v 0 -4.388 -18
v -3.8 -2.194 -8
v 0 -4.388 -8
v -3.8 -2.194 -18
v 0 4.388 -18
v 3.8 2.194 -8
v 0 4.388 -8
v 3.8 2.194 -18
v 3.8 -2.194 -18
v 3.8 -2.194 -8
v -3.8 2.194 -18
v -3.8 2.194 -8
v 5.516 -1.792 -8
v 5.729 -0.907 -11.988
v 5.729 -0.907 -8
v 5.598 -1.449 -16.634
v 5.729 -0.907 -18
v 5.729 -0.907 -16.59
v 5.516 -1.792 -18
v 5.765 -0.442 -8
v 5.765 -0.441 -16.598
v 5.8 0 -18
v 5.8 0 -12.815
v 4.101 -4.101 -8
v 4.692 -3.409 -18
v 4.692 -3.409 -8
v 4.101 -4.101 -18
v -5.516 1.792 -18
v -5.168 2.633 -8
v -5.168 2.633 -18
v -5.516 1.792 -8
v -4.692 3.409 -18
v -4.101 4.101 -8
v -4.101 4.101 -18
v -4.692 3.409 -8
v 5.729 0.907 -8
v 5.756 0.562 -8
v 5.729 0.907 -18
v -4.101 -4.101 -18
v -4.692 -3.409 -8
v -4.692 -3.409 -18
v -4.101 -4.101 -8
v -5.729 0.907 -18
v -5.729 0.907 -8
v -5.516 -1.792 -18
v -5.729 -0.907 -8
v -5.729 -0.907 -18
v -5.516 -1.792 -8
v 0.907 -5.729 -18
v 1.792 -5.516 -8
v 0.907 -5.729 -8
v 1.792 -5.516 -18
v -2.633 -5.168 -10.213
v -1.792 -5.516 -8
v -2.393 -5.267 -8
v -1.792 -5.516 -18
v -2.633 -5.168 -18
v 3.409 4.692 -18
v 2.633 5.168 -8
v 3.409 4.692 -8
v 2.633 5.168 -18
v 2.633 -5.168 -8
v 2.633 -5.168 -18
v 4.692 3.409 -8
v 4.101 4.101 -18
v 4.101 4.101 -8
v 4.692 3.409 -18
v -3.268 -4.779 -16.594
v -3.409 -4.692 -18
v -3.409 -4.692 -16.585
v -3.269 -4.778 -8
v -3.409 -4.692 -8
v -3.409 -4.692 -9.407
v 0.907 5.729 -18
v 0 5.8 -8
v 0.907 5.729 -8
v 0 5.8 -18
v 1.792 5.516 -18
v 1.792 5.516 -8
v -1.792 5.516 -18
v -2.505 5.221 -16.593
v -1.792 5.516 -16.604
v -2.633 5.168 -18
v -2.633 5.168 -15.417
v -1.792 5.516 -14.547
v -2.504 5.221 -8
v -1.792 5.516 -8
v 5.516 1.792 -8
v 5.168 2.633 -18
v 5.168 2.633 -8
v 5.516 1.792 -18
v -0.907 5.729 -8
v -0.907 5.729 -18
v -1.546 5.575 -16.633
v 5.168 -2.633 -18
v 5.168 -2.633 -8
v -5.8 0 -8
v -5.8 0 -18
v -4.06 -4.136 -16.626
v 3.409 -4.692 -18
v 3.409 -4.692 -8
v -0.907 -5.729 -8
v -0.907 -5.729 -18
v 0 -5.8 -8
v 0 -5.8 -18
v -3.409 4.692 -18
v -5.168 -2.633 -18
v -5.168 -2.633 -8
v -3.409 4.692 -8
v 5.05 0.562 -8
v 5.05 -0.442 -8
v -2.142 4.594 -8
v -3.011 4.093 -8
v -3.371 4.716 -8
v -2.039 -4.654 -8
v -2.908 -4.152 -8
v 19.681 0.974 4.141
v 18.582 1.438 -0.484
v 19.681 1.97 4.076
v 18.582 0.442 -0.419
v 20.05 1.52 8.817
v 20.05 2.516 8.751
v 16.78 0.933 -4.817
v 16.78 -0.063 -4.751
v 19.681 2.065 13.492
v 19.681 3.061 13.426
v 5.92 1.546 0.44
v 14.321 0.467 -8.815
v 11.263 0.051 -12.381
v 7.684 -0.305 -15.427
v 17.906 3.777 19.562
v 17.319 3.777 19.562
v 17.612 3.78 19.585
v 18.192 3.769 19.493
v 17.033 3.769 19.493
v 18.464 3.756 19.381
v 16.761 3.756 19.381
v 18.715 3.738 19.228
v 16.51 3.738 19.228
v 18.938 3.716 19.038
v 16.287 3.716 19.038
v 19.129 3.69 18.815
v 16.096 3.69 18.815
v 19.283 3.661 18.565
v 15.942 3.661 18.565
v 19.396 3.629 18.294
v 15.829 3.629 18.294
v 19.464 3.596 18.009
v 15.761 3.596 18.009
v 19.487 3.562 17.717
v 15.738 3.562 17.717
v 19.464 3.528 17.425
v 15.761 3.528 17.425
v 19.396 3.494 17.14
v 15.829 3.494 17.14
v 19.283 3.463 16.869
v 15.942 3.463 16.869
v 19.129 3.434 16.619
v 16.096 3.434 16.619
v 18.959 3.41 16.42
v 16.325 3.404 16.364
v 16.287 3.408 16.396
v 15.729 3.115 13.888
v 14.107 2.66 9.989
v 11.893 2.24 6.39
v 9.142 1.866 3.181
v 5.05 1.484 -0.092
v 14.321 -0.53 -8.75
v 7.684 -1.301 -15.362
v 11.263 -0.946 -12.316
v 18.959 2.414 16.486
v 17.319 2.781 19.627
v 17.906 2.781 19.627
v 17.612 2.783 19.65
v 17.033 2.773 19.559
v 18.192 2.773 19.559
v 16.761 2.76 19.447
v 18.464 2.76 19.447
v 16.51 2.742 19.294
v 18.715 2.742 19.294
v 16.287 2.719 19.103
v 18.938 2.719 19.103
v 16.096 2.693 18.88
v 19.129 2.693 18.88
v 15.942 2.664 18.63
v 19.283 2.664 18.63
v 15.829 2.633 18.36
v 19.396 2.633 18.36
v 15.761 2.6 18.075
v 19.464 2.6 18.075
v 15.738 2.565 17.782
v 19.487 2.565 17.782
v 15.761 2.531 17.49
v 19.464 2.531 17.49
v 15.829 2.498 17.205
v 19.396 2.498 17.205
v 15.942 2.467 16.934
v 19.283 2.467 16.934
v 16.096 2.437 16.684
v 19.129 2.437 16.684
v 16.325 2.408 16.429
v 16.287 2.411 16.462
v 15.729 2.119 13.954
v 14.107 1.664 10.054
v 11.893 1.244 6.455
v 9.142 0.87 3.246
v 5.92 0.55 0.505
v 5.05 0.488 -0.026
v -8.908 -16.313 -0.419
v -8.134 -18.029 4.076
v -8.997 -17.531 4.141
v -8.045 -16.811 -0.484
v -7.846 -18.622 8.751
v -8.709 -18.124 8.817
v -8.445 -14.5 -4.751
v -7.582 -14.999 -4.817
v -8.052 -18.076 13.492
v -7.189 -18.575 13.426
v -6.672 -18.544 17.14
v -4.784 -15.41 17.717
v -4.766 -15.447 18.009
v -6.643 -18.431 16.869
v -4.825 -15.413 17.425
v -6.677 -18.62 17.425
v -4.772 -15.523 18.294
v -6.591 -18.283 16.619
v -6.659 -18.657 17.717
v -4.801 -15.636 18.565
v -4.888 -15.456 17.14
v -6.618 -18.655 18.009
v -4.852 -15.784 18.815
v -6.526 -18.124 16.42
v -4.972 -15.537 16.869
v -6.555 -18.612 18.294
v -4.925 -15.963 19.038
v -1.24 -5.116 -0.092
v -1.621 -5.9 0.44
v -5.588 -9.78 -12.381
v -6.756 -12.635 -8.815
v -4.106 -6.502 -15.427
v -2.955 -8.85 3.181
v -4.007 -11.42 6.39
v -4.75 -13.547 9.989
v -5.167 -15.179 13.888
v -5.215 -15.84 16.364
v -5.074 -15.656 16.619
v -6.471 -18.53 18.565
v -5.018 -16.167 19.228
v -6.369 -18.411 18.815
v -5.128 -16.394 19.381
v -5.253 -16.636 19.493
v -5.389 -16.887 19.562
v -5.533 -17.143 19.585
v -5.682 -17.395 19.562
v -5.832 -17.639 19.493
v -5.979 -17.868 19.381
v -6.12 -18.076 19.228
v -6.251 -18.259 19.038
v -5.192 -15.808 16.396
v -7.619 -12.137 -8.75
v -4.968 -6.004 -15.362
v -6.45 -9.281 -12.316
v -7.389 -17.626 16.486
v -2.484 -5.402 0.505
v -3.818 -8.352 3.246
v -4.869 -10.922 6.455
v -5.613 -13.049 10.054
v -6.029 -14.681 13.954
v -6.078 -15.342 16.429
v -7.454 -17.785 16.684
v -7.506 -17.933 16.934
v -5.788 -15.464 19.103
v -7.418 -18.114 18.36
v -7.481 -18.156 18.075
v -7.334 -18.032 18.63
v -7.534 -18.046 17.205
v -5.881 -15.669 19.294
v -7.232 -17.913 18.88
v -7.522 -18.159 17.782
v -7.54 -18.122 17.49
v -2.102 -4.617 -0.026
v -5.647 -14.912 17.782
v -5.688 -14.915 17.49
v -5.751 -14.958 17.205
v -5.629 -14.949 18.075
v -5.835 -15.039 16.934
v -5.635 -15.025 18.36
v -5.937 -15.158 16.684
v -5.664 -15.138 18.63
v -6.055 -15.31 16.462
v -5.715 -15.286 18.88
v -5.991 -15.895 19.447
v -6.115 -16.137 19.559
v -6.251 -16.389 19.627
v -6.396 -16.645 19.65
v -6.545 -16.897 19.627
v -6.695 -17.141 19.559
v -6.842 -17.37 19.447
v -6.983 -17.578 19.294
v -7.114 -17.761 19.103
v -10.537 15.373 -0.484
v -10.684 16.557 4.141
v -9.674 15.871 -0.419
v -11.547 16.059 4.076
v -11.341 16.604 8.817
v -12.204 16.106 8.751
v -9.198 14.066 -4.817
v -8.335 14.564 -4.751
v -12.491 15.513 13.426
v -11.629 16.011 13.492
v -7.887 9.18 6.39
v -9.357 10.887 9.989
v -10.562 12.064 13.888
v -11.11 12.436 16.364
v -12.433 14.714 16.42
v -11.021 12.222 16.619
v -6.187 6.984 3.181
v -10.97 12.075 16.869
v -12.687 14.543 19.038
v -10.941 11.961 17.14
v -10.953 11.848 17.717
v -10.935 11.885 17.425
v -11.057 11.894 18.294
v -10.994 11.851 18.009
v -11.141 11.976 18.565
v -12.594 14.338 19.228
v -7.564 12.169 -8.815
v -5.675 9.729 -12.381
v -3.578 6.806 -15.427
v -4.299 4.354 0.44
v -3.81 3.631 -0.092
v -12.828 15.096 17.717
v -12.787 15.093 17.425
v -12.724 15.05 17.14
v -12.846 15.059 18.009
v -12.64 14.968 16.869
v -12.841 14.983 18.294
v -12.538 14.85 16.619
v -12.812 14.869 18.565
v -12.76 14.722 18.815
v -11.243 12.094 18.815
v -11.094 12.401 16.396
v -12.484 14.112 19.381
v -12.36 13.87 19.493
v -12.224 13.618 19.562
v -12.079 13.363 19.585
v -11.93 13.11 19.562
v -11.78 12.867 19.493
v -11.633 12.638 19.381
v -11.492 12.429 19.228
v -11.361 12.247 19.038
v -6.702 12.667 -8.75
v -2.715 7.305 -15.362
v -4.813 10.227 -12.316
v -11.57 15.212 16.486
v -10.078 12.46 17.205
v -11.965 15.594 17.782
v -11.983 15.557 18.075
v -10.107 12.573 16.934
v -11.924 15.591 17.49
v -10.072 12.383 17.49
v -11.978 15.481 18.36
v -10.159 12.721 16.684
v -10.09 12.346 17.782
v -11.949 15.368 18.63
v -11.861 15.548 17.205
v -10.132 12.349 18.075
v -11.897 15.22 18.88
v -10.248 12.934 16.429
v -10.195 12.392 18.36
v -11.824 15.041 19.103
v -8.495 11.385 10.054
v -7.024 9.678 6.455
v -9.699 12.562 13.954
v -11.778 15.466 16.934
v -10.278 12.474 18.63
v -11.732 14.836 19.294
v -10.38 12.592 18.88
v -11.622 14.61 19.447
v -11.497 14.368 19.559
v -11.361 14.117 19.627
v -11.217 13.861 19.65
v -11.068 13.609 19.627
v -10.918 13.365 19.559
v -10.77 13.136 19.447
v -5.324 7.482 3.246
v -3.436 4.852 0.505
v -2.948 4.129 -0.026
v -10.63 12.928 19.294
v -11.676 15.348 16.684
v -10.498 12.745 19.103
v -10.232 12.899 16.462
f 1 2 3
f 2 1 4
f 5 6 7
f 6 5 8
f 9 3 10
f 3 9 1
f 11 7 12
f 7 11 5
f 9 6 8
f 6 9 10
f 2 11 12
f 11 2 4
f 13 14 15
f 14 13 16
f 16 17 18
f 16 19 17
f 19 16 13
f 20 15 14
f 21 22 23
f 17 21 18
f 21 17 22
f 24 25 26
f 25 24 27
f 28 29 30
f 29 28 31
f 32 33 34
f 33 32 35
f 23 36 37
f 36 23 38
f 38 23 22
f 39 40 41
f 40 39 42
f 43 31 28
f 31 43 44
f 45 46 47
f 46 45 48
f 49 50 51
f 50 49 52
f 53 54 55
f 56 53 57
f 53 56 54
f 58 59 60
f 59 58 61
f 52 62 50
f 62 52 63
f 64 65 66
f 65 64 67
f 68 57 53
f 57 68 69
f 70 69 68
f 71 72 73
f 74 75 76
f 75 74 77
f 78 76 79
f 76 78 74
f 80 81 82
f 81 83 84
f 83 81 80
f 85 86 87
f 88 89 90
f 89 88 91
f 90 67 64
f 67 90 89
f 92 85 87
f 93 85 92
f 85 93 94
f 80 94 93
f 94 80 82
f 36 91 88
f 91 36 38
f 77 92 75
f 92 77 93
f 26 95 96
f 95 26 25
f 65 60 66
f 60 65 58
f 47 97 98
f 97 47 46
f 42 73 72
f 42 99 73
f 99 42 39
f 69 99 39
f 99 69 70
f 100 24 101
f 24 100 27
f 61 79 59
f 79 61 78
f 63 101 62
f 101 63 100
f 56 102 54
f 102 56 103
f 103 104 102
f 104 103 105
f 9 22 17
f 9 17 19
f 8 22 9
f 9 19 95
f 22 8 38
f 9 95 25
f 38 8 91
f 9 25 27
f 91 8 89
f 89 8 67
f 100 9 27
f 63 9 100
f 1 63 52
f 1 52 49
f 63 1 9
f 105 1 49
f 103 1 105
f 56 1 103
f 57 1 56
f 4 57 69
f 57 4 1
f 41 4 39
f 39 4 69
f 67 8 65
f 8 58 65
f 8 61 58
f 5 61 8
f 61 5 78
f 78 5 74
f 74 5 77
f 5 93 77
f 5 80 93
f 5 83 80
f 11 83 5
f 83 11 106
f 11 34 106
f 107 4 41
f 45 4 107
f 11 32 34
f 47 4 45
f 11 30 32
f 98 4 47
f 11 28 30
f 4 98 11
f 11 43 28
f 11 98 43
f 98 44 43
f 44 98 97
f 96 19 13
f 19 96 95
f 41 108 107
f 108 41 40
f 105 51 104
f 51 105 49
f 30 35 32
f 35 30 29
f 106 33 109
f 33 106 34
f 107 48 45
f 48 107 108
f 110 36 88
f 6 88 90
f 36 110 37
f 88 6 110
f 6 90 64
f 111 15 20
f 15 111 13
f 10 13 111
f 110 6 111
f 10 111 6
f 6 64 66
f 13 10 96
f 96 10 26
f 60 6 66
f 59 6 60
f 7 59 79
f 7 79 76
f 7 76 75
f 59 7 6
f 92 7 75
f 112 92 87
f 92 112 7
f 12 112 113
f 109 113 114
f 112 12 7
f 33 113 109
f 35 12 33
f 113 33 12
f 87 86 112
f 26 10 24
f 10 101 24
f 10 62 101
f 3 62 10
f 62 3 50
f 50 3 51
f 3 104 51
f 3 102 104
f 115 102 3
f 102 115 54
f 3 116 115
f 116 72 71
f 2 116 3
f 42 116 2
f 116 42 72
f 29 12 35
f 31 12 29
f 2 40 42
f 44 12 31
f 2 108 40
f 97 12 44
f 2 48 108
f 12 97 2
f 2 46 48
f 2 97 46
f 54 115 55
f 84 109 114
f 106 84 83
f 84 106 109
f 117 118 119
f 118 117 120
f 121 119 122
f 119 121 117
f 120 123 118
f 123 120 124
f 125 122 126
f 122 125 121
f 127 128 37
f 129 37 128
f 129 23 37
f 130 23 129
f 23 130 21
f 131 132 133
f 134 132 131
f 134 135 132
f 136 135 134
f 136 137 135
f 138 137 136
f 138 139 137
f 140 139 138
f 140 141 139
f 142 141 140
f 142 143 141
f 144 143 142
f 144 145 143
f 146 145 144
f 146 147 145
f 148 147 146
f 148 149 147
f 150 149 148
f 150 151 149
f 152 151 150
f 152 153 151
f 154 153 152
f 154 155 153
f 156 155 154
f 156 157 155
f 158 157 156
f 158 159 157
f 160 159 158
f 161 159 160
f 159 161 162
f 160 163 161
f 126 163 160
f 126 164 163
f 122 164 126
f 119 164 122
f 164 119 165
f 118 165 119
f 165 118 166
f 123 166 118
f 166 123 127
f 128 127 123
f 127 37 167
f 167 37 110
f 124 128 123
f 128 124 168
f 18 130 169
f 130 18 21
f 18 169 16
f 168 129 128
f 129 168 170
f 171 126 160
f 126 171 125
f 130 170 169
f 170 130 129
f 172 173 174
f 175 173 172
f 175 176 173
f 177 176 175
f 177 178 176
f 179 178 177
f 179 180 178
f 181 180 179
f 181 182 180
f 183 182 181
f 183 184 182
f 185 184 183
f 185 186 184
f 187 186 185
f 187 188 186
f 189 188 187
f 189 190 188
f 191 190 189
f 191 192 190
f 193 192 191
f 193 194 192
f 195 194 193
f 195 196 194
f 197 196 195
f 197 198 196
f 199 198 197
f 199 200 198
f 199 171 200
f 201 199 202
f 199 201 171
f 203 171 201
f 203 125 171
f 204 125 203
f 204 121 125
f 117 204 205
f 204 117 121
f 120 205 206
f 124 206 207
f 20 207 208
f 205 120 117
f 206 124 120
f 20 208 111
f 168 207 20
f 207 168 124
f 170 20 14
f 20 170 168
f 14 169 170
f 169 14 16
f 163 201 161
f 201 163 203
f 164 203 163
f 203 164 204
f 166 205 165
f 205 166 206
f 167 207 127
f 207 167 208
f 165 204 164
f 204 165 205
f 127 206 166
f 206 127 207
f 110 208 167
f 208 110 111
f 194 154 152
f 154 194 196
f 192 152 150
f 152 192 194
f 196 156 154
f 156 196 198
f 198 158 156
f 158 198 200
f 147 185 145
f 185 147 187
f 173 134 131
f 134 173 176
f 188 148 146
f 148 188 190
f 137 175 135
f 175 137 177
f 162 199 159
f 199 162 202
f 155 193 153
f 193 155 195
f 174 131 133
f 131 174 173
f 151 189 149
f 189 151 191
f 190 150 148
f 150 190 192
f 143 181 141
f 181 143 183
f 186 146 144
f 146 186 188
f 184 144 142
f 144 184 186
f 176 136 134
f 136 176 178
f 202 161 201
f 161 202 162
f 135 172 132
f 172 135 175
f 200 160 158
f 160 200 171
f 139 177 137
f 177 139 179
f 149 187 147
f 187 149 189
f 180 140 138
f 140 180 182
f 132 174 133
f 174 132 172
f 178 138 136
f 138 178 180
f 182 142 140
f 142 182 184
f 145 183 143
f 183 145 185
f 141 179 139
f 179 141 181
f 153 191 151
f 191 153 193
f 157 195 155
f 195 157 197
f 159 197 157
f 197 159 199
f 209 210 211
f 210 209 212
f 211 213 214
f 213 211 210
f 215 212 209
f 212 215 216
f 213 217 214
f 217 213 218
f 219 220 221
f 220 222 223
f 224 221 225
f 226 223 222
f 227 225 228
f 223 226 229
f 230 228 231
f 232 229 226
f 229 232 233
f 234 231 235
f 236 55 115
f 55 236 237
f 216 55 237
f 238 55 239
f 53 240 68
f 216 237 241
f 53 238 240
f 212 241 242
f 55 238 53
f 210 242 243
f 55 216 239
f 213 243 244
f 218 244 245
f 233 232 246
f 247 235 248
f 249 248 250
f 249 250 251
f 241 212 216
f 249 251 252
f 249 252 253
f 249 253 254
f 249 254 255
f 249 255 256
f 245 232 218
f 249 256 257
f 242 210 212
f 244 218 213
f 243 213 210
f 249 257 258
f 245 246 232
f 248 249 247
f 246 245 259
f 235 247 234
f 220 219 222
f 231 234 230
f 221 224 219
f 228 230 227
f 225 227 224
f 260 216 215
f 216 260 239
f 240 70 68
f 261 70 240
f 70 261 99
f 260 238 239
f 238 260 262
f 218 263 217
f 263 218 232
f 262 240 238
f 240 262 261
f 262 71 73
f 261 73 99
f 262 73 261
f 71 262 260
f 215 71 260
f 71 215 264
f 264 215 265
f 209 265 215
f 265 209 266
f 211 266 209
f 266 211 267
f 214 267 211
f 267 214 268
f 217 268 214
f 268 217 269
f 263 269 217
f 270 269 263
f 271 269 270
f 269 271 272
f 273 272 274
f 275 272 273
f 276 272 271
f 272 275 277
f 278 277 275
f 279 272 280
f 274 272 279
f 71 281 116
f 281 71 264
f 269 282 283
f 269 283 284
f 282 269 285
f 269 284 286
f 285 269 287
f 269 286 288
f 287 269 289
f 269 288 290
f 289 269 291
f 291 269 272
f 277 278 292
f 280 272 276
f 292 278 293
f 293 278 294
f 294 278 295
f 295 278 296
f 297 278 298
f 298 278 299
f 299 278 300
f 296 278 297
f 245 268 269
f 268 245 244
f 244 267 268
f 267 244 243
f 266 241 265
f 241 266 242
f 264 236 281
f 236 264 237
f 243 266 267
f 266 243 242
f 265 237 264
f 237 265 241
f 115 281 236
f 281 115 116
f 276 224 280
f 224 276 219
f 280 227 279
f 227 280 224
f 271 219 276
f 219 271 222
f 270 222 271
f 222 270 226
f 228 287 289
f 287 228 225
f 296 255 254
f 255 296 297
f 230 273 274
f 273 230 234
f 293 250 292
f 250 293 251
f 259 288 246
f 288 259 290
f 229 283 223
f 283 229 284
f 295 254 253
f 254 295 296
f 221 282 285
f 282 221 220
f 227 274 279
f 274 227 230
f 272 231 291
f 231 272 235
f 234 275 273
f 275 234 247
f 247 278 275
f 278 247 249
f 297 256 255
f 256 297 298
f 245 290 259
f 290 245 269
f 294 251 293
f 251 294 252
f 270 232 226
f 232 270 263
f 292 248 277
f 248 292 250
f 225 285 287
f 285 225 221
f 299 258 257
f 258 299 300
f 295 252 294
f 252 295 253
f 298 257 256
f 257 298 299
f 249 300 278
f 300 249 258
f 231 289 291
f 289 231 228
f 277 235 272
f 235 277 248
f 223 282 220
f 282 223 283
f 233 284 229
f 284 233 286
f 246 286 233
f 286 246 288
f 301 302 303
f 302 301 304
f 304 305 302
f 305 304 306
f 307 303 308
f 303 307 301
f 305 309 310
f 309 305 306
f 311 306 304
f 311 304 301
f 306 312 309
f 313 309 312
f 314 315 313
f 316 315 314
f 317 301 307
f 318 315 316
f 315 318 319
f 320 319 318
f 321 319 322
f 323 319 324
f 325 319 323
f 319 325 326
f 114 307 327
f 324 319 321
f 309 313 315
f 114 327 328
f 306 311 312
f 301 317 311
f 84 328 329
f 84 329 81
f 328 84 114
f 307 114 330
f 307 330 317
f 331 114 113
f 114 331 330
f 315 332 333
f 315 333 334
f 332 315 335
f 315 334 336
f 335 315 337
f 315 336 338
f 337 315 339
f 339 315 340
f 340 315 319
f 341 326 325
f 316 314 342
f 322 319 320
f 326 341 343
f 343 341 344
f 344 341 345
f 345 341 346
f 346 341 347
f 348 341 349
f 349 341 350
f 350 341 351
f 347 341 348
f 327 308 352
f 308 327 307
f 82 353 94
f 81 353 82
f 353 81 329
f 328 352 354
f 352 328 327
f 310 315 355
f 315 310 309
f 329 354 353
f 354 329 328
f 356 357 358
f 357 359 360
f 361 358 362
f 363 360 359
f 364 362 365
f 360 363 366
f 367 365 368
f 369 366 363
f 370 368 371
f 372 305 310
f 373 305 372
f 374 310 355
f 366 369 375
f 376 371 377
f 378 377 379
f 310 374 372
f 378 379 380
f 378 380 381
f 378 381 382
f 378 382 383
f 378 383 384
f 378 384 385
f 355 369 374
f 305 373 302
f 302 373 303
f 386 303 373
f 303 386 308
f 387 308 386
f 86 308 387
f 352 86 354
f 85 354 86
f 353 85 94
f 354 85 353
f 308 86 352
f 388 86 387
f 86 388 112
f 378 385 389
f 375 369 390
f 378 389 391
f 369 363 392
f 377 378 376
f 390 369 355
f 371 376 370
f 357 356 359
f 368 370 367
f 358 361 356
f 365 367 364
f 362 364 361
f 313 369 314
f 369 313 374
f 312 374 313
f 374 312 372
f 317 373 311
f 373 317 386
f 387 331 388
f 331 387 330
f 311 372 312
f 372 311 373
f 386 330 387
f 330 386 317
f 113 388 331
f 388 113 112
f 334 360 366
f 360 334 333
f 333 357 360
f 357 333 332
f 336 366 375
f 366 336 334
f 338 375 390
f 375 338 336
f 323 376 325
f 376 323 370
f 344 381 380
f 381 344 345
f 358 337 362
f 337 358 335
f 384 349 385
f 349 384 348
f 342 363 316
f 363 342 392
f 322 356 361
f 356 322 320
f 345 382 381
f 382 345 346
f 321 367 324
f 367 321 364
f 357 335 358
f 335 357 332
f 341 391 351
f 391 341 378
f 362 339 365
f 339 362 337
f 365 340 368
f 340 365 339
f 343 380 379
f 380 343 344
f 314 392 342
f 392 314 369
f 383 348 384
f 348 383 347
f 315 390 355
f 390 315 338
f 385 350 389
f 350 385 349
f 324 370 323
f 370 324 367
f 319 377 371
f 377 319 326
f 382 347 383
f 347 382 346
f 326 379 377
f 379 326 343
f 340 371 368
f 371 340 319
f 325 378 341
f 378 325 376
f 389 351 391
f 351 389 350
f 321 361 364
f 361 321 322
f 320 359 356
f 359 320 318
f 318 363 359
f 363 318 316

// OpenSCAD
/*
 * Convertible Pencil Rocket / Pencil Stand
 *
 * by Alex Franke (CodeCreations), Nov 2012
 * http://www.theFrankes.com
 * 
 * Licenced under Creative Commons Attribution - Non-Commercial - Share Alike 3.0 
 * 
 * INSTRUCTIONS: Choose some values in the "User-defined values" section, render, and print. 
 * 
 * v1.10, Dec 1, 2012: Added spin angle to angle fins for spinning.
 * v1.00, Nov 28, 2012: Initial Release.
 *
 * TODO: 
 *   * Nothing at this time. 
 */

/////////////////////////////////////////////////////////////////////////////
// User-defined values... 
/////////////////////////////////////////////////////////////////////////////

finThickness     = 1;    // Thickness of fins
finCount         = 3;    // Number of fins
finInset         = 0.75; // Distance fins are inset from surface
finScale         = 0.75; // Scale the fins larger (>1) or smaller (<1)
spinAngle        = -5;   // Rotation of fins in order to provide spin
pencilInDiameter = 7.6;  // Diameter of pencil (flat to flat for hex) 6.85 == Ticonderoga #2
bandThickness    = 2;    // The maximum thickness of the band the fins are attached to 
bandHeight       = 10;   // The height of the band
bandTranslation  = 8;    // The distance the band is translated toward the top of the fins

$fn              = 40;   // Overall curve quality


/////////////////////////////////////////////////////////////////////////////
// The code... 
/////////////////////////////////////////////////////////////////////////////

rotate([180,0,0]) 
union() {
	translate([0,0,bandTranslation]) 
	difference() {
		cylinder(h=bandHeight, r=pencilInDiameter/2+bandThickness);
	
		translate([0,0,(bandHeight)/2]) 
			rotate([0,0,30]) 
			nut([pencilInDiameter, bandHeight+1]);
	
	}
	
	for( i=[0:finCount-1] ) {
	
		rotate([0,0,(360/finCount)*i]) 
		translate([pencilInDiameter/2+bandThickness-finInset, 0, 0]) 
		rotate([90,0,0]) 
		scale([finScale,finScale,1]) 
		translate([0,11.35,0]) 
		rotate([spinAngle,0,0]) 
		fin(); 
	
	}
}

/////////////////////////////////////////////////////////////////////////////
// Modules... 
/////////////////////////////////////////////////////////////////////////////

module fin() {
	translate([-20,-11.8-11.35,0]) 
	union() {
		difference() { 
			cylinder(h=finThickness, r=40, center=true);
			
			translate([0,-18,0]) 
				cylinder(h=finThickness+1, r=36, center=true);
	
			translate([-25,0,0]) 
				cube([90,90,finThickness+1], center=true);

			translate([36,-16,0]) 
				cube([10,10,finThickness+1], center=true);
		}

		translate([36.75,-12,0]) 
			cylinder(h=finThickness, r=2.5, center=true);
	}
}


// Same nutty code I use in my other designs...
// nutSize = [inDiameter,thickness]
module nut( nutSize ) { 
	side = nutSize[0] * tan( 180/6 );
	if ( nutSize[0] * nutSize[1] != 0 ) {
		for ( i = [0 : 2] ) {
			rotate( i*120, [0, 0, 1]) 
				cube( [side, nutSize[0], nutSize[1]], center=true );
		}
	}
}
